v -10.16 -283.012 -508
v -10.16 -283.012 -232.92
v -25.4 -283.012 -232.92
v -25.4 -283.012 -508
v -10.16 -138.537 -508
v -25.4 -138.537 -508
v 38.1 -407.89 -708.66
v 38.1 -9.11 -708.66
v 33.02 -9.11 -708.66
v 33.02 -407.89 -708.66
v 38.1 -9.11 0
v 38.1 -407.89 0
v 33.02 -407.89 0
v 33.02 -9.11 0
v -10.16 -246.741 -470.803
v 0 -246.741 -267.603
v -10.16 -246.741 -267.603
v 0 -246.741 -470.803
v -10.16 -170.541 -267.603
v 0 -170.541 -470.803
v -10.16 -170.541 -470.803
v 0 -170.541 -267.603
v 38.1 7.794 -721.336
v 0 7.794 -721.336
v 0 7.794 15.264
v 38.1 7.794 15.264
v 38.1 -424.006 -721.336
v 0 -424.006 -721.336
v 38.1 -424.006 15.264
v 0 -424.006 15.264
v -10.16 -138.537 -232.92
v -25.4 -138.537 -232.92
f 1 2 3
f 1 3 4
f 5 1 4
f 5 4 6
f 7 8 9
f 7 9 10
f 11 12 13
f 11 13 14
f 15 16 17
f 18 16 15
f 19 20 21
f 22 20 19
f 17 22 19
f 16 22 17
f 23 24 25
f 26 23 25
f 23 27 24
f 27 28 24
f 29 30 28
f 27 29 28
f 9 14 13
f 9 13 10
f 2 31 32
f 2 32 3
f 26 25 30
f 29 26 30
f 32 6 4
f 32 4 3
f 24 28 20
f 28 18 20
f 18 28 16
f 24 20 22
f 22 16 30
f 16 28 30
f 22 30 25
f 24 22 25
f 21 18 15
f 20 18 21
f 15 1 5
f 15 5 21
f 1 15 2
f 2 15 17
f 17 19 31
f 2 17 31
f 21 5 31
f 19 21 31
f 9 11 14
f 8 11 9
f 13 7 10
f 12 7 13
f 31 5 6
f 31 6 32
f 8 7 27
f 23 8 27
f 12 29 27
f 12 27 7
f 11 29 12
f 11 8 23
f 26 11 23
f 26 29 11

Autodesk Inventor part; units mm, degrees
ref_plane "YZ Plane" through (0, 0, 0) normal (1, 0, 0) x (0, 1, 0)
ref_plane "XZ Plane" through (0, 0, 0) normal (0, 1, 0) x (-1, 0, 0)
ref_plane "XY Plane" through (0, 0, 0) normal (0, 0, 1) x (1, 0, 0)
sketch "Sketch1" plane through (0, 0, 0) normal (1, 0, 0) x (0, 1, 0)
  line L0 (7.7943, 15.2638) -> (-424.0057, 15.2638)
  line L1 (-424.0057, 15.2638) -> (-424.0057, -721.3362)
  line L2 (-424.0057, -721.3362) -> (7.7943, -721.3362)
  line L3 (7.7943, -721.3362) -> (7.7943, 15.2638)
  point P0 (0, 0)
  dimension "d0" = 431.8
  dimension "d1" = 736.6
extrude "Extrusion1" add sketch "Sketch1" along normal blind 38.1
sketch "Sketch2" plane through (38.1, 0, 0) normal (1, 0, 0) x (0, 0, -1)
  line L0 (0, -9.1095) -> (708.66, -9.1095)
  line L1 (708.66, -9.1095) -> (708.66, -407.8895)
  line L2 (708.66, -407.8895) -> (0, -407.8895)
  line L3 (0, -407.8895) -> (0, -9.1095)
  point P0 (0, 0)
  dimension "d4" = 708.66
  dimension "d5" = 398.78
extrude "Extrusion2" cut sketch "Sketch2" against normal blind 5.08
sketch "Sketch3" plane through (0, 0, 0) normal (-1, 0, 0) x (0, 0, 1)
  line L0 (-470.803, -170.5411) -> (-267.603, -170.5411)
  line L1 (-267.603, -170.5411) -> (-267.603, -246.7411)
  line L2 (-267.603, -246.7411) -> (-470.803, -246.7411)
  line L3 (-470.803, -246.7411) -> (-470.803, -170.5411)
  point P0 (0, 0)
extrude "Extrusion3" add sketch "Sketch3" along normal blind 10.16
sketch "Sketch4" plane through (-10.16, 0, 0) normal (-1, 0, 0) x (0, 0, 1)
  line L0 (-508, -138.5372) -> (-232.9195, -138.5372)
  line L1 (-232.9195, -138.5372) -> (-232.9195, -283.012)
  line L2 (-232.9195, -283.012) -> (-508, -283.012)
  line L3 (-508, -283.012) -> (-508, -138.5372)
  point P0 (0, 0)
extrude "Extrusion4" add sketch "Sketch4" along normal blind 15.24
properties part number "tv1"
